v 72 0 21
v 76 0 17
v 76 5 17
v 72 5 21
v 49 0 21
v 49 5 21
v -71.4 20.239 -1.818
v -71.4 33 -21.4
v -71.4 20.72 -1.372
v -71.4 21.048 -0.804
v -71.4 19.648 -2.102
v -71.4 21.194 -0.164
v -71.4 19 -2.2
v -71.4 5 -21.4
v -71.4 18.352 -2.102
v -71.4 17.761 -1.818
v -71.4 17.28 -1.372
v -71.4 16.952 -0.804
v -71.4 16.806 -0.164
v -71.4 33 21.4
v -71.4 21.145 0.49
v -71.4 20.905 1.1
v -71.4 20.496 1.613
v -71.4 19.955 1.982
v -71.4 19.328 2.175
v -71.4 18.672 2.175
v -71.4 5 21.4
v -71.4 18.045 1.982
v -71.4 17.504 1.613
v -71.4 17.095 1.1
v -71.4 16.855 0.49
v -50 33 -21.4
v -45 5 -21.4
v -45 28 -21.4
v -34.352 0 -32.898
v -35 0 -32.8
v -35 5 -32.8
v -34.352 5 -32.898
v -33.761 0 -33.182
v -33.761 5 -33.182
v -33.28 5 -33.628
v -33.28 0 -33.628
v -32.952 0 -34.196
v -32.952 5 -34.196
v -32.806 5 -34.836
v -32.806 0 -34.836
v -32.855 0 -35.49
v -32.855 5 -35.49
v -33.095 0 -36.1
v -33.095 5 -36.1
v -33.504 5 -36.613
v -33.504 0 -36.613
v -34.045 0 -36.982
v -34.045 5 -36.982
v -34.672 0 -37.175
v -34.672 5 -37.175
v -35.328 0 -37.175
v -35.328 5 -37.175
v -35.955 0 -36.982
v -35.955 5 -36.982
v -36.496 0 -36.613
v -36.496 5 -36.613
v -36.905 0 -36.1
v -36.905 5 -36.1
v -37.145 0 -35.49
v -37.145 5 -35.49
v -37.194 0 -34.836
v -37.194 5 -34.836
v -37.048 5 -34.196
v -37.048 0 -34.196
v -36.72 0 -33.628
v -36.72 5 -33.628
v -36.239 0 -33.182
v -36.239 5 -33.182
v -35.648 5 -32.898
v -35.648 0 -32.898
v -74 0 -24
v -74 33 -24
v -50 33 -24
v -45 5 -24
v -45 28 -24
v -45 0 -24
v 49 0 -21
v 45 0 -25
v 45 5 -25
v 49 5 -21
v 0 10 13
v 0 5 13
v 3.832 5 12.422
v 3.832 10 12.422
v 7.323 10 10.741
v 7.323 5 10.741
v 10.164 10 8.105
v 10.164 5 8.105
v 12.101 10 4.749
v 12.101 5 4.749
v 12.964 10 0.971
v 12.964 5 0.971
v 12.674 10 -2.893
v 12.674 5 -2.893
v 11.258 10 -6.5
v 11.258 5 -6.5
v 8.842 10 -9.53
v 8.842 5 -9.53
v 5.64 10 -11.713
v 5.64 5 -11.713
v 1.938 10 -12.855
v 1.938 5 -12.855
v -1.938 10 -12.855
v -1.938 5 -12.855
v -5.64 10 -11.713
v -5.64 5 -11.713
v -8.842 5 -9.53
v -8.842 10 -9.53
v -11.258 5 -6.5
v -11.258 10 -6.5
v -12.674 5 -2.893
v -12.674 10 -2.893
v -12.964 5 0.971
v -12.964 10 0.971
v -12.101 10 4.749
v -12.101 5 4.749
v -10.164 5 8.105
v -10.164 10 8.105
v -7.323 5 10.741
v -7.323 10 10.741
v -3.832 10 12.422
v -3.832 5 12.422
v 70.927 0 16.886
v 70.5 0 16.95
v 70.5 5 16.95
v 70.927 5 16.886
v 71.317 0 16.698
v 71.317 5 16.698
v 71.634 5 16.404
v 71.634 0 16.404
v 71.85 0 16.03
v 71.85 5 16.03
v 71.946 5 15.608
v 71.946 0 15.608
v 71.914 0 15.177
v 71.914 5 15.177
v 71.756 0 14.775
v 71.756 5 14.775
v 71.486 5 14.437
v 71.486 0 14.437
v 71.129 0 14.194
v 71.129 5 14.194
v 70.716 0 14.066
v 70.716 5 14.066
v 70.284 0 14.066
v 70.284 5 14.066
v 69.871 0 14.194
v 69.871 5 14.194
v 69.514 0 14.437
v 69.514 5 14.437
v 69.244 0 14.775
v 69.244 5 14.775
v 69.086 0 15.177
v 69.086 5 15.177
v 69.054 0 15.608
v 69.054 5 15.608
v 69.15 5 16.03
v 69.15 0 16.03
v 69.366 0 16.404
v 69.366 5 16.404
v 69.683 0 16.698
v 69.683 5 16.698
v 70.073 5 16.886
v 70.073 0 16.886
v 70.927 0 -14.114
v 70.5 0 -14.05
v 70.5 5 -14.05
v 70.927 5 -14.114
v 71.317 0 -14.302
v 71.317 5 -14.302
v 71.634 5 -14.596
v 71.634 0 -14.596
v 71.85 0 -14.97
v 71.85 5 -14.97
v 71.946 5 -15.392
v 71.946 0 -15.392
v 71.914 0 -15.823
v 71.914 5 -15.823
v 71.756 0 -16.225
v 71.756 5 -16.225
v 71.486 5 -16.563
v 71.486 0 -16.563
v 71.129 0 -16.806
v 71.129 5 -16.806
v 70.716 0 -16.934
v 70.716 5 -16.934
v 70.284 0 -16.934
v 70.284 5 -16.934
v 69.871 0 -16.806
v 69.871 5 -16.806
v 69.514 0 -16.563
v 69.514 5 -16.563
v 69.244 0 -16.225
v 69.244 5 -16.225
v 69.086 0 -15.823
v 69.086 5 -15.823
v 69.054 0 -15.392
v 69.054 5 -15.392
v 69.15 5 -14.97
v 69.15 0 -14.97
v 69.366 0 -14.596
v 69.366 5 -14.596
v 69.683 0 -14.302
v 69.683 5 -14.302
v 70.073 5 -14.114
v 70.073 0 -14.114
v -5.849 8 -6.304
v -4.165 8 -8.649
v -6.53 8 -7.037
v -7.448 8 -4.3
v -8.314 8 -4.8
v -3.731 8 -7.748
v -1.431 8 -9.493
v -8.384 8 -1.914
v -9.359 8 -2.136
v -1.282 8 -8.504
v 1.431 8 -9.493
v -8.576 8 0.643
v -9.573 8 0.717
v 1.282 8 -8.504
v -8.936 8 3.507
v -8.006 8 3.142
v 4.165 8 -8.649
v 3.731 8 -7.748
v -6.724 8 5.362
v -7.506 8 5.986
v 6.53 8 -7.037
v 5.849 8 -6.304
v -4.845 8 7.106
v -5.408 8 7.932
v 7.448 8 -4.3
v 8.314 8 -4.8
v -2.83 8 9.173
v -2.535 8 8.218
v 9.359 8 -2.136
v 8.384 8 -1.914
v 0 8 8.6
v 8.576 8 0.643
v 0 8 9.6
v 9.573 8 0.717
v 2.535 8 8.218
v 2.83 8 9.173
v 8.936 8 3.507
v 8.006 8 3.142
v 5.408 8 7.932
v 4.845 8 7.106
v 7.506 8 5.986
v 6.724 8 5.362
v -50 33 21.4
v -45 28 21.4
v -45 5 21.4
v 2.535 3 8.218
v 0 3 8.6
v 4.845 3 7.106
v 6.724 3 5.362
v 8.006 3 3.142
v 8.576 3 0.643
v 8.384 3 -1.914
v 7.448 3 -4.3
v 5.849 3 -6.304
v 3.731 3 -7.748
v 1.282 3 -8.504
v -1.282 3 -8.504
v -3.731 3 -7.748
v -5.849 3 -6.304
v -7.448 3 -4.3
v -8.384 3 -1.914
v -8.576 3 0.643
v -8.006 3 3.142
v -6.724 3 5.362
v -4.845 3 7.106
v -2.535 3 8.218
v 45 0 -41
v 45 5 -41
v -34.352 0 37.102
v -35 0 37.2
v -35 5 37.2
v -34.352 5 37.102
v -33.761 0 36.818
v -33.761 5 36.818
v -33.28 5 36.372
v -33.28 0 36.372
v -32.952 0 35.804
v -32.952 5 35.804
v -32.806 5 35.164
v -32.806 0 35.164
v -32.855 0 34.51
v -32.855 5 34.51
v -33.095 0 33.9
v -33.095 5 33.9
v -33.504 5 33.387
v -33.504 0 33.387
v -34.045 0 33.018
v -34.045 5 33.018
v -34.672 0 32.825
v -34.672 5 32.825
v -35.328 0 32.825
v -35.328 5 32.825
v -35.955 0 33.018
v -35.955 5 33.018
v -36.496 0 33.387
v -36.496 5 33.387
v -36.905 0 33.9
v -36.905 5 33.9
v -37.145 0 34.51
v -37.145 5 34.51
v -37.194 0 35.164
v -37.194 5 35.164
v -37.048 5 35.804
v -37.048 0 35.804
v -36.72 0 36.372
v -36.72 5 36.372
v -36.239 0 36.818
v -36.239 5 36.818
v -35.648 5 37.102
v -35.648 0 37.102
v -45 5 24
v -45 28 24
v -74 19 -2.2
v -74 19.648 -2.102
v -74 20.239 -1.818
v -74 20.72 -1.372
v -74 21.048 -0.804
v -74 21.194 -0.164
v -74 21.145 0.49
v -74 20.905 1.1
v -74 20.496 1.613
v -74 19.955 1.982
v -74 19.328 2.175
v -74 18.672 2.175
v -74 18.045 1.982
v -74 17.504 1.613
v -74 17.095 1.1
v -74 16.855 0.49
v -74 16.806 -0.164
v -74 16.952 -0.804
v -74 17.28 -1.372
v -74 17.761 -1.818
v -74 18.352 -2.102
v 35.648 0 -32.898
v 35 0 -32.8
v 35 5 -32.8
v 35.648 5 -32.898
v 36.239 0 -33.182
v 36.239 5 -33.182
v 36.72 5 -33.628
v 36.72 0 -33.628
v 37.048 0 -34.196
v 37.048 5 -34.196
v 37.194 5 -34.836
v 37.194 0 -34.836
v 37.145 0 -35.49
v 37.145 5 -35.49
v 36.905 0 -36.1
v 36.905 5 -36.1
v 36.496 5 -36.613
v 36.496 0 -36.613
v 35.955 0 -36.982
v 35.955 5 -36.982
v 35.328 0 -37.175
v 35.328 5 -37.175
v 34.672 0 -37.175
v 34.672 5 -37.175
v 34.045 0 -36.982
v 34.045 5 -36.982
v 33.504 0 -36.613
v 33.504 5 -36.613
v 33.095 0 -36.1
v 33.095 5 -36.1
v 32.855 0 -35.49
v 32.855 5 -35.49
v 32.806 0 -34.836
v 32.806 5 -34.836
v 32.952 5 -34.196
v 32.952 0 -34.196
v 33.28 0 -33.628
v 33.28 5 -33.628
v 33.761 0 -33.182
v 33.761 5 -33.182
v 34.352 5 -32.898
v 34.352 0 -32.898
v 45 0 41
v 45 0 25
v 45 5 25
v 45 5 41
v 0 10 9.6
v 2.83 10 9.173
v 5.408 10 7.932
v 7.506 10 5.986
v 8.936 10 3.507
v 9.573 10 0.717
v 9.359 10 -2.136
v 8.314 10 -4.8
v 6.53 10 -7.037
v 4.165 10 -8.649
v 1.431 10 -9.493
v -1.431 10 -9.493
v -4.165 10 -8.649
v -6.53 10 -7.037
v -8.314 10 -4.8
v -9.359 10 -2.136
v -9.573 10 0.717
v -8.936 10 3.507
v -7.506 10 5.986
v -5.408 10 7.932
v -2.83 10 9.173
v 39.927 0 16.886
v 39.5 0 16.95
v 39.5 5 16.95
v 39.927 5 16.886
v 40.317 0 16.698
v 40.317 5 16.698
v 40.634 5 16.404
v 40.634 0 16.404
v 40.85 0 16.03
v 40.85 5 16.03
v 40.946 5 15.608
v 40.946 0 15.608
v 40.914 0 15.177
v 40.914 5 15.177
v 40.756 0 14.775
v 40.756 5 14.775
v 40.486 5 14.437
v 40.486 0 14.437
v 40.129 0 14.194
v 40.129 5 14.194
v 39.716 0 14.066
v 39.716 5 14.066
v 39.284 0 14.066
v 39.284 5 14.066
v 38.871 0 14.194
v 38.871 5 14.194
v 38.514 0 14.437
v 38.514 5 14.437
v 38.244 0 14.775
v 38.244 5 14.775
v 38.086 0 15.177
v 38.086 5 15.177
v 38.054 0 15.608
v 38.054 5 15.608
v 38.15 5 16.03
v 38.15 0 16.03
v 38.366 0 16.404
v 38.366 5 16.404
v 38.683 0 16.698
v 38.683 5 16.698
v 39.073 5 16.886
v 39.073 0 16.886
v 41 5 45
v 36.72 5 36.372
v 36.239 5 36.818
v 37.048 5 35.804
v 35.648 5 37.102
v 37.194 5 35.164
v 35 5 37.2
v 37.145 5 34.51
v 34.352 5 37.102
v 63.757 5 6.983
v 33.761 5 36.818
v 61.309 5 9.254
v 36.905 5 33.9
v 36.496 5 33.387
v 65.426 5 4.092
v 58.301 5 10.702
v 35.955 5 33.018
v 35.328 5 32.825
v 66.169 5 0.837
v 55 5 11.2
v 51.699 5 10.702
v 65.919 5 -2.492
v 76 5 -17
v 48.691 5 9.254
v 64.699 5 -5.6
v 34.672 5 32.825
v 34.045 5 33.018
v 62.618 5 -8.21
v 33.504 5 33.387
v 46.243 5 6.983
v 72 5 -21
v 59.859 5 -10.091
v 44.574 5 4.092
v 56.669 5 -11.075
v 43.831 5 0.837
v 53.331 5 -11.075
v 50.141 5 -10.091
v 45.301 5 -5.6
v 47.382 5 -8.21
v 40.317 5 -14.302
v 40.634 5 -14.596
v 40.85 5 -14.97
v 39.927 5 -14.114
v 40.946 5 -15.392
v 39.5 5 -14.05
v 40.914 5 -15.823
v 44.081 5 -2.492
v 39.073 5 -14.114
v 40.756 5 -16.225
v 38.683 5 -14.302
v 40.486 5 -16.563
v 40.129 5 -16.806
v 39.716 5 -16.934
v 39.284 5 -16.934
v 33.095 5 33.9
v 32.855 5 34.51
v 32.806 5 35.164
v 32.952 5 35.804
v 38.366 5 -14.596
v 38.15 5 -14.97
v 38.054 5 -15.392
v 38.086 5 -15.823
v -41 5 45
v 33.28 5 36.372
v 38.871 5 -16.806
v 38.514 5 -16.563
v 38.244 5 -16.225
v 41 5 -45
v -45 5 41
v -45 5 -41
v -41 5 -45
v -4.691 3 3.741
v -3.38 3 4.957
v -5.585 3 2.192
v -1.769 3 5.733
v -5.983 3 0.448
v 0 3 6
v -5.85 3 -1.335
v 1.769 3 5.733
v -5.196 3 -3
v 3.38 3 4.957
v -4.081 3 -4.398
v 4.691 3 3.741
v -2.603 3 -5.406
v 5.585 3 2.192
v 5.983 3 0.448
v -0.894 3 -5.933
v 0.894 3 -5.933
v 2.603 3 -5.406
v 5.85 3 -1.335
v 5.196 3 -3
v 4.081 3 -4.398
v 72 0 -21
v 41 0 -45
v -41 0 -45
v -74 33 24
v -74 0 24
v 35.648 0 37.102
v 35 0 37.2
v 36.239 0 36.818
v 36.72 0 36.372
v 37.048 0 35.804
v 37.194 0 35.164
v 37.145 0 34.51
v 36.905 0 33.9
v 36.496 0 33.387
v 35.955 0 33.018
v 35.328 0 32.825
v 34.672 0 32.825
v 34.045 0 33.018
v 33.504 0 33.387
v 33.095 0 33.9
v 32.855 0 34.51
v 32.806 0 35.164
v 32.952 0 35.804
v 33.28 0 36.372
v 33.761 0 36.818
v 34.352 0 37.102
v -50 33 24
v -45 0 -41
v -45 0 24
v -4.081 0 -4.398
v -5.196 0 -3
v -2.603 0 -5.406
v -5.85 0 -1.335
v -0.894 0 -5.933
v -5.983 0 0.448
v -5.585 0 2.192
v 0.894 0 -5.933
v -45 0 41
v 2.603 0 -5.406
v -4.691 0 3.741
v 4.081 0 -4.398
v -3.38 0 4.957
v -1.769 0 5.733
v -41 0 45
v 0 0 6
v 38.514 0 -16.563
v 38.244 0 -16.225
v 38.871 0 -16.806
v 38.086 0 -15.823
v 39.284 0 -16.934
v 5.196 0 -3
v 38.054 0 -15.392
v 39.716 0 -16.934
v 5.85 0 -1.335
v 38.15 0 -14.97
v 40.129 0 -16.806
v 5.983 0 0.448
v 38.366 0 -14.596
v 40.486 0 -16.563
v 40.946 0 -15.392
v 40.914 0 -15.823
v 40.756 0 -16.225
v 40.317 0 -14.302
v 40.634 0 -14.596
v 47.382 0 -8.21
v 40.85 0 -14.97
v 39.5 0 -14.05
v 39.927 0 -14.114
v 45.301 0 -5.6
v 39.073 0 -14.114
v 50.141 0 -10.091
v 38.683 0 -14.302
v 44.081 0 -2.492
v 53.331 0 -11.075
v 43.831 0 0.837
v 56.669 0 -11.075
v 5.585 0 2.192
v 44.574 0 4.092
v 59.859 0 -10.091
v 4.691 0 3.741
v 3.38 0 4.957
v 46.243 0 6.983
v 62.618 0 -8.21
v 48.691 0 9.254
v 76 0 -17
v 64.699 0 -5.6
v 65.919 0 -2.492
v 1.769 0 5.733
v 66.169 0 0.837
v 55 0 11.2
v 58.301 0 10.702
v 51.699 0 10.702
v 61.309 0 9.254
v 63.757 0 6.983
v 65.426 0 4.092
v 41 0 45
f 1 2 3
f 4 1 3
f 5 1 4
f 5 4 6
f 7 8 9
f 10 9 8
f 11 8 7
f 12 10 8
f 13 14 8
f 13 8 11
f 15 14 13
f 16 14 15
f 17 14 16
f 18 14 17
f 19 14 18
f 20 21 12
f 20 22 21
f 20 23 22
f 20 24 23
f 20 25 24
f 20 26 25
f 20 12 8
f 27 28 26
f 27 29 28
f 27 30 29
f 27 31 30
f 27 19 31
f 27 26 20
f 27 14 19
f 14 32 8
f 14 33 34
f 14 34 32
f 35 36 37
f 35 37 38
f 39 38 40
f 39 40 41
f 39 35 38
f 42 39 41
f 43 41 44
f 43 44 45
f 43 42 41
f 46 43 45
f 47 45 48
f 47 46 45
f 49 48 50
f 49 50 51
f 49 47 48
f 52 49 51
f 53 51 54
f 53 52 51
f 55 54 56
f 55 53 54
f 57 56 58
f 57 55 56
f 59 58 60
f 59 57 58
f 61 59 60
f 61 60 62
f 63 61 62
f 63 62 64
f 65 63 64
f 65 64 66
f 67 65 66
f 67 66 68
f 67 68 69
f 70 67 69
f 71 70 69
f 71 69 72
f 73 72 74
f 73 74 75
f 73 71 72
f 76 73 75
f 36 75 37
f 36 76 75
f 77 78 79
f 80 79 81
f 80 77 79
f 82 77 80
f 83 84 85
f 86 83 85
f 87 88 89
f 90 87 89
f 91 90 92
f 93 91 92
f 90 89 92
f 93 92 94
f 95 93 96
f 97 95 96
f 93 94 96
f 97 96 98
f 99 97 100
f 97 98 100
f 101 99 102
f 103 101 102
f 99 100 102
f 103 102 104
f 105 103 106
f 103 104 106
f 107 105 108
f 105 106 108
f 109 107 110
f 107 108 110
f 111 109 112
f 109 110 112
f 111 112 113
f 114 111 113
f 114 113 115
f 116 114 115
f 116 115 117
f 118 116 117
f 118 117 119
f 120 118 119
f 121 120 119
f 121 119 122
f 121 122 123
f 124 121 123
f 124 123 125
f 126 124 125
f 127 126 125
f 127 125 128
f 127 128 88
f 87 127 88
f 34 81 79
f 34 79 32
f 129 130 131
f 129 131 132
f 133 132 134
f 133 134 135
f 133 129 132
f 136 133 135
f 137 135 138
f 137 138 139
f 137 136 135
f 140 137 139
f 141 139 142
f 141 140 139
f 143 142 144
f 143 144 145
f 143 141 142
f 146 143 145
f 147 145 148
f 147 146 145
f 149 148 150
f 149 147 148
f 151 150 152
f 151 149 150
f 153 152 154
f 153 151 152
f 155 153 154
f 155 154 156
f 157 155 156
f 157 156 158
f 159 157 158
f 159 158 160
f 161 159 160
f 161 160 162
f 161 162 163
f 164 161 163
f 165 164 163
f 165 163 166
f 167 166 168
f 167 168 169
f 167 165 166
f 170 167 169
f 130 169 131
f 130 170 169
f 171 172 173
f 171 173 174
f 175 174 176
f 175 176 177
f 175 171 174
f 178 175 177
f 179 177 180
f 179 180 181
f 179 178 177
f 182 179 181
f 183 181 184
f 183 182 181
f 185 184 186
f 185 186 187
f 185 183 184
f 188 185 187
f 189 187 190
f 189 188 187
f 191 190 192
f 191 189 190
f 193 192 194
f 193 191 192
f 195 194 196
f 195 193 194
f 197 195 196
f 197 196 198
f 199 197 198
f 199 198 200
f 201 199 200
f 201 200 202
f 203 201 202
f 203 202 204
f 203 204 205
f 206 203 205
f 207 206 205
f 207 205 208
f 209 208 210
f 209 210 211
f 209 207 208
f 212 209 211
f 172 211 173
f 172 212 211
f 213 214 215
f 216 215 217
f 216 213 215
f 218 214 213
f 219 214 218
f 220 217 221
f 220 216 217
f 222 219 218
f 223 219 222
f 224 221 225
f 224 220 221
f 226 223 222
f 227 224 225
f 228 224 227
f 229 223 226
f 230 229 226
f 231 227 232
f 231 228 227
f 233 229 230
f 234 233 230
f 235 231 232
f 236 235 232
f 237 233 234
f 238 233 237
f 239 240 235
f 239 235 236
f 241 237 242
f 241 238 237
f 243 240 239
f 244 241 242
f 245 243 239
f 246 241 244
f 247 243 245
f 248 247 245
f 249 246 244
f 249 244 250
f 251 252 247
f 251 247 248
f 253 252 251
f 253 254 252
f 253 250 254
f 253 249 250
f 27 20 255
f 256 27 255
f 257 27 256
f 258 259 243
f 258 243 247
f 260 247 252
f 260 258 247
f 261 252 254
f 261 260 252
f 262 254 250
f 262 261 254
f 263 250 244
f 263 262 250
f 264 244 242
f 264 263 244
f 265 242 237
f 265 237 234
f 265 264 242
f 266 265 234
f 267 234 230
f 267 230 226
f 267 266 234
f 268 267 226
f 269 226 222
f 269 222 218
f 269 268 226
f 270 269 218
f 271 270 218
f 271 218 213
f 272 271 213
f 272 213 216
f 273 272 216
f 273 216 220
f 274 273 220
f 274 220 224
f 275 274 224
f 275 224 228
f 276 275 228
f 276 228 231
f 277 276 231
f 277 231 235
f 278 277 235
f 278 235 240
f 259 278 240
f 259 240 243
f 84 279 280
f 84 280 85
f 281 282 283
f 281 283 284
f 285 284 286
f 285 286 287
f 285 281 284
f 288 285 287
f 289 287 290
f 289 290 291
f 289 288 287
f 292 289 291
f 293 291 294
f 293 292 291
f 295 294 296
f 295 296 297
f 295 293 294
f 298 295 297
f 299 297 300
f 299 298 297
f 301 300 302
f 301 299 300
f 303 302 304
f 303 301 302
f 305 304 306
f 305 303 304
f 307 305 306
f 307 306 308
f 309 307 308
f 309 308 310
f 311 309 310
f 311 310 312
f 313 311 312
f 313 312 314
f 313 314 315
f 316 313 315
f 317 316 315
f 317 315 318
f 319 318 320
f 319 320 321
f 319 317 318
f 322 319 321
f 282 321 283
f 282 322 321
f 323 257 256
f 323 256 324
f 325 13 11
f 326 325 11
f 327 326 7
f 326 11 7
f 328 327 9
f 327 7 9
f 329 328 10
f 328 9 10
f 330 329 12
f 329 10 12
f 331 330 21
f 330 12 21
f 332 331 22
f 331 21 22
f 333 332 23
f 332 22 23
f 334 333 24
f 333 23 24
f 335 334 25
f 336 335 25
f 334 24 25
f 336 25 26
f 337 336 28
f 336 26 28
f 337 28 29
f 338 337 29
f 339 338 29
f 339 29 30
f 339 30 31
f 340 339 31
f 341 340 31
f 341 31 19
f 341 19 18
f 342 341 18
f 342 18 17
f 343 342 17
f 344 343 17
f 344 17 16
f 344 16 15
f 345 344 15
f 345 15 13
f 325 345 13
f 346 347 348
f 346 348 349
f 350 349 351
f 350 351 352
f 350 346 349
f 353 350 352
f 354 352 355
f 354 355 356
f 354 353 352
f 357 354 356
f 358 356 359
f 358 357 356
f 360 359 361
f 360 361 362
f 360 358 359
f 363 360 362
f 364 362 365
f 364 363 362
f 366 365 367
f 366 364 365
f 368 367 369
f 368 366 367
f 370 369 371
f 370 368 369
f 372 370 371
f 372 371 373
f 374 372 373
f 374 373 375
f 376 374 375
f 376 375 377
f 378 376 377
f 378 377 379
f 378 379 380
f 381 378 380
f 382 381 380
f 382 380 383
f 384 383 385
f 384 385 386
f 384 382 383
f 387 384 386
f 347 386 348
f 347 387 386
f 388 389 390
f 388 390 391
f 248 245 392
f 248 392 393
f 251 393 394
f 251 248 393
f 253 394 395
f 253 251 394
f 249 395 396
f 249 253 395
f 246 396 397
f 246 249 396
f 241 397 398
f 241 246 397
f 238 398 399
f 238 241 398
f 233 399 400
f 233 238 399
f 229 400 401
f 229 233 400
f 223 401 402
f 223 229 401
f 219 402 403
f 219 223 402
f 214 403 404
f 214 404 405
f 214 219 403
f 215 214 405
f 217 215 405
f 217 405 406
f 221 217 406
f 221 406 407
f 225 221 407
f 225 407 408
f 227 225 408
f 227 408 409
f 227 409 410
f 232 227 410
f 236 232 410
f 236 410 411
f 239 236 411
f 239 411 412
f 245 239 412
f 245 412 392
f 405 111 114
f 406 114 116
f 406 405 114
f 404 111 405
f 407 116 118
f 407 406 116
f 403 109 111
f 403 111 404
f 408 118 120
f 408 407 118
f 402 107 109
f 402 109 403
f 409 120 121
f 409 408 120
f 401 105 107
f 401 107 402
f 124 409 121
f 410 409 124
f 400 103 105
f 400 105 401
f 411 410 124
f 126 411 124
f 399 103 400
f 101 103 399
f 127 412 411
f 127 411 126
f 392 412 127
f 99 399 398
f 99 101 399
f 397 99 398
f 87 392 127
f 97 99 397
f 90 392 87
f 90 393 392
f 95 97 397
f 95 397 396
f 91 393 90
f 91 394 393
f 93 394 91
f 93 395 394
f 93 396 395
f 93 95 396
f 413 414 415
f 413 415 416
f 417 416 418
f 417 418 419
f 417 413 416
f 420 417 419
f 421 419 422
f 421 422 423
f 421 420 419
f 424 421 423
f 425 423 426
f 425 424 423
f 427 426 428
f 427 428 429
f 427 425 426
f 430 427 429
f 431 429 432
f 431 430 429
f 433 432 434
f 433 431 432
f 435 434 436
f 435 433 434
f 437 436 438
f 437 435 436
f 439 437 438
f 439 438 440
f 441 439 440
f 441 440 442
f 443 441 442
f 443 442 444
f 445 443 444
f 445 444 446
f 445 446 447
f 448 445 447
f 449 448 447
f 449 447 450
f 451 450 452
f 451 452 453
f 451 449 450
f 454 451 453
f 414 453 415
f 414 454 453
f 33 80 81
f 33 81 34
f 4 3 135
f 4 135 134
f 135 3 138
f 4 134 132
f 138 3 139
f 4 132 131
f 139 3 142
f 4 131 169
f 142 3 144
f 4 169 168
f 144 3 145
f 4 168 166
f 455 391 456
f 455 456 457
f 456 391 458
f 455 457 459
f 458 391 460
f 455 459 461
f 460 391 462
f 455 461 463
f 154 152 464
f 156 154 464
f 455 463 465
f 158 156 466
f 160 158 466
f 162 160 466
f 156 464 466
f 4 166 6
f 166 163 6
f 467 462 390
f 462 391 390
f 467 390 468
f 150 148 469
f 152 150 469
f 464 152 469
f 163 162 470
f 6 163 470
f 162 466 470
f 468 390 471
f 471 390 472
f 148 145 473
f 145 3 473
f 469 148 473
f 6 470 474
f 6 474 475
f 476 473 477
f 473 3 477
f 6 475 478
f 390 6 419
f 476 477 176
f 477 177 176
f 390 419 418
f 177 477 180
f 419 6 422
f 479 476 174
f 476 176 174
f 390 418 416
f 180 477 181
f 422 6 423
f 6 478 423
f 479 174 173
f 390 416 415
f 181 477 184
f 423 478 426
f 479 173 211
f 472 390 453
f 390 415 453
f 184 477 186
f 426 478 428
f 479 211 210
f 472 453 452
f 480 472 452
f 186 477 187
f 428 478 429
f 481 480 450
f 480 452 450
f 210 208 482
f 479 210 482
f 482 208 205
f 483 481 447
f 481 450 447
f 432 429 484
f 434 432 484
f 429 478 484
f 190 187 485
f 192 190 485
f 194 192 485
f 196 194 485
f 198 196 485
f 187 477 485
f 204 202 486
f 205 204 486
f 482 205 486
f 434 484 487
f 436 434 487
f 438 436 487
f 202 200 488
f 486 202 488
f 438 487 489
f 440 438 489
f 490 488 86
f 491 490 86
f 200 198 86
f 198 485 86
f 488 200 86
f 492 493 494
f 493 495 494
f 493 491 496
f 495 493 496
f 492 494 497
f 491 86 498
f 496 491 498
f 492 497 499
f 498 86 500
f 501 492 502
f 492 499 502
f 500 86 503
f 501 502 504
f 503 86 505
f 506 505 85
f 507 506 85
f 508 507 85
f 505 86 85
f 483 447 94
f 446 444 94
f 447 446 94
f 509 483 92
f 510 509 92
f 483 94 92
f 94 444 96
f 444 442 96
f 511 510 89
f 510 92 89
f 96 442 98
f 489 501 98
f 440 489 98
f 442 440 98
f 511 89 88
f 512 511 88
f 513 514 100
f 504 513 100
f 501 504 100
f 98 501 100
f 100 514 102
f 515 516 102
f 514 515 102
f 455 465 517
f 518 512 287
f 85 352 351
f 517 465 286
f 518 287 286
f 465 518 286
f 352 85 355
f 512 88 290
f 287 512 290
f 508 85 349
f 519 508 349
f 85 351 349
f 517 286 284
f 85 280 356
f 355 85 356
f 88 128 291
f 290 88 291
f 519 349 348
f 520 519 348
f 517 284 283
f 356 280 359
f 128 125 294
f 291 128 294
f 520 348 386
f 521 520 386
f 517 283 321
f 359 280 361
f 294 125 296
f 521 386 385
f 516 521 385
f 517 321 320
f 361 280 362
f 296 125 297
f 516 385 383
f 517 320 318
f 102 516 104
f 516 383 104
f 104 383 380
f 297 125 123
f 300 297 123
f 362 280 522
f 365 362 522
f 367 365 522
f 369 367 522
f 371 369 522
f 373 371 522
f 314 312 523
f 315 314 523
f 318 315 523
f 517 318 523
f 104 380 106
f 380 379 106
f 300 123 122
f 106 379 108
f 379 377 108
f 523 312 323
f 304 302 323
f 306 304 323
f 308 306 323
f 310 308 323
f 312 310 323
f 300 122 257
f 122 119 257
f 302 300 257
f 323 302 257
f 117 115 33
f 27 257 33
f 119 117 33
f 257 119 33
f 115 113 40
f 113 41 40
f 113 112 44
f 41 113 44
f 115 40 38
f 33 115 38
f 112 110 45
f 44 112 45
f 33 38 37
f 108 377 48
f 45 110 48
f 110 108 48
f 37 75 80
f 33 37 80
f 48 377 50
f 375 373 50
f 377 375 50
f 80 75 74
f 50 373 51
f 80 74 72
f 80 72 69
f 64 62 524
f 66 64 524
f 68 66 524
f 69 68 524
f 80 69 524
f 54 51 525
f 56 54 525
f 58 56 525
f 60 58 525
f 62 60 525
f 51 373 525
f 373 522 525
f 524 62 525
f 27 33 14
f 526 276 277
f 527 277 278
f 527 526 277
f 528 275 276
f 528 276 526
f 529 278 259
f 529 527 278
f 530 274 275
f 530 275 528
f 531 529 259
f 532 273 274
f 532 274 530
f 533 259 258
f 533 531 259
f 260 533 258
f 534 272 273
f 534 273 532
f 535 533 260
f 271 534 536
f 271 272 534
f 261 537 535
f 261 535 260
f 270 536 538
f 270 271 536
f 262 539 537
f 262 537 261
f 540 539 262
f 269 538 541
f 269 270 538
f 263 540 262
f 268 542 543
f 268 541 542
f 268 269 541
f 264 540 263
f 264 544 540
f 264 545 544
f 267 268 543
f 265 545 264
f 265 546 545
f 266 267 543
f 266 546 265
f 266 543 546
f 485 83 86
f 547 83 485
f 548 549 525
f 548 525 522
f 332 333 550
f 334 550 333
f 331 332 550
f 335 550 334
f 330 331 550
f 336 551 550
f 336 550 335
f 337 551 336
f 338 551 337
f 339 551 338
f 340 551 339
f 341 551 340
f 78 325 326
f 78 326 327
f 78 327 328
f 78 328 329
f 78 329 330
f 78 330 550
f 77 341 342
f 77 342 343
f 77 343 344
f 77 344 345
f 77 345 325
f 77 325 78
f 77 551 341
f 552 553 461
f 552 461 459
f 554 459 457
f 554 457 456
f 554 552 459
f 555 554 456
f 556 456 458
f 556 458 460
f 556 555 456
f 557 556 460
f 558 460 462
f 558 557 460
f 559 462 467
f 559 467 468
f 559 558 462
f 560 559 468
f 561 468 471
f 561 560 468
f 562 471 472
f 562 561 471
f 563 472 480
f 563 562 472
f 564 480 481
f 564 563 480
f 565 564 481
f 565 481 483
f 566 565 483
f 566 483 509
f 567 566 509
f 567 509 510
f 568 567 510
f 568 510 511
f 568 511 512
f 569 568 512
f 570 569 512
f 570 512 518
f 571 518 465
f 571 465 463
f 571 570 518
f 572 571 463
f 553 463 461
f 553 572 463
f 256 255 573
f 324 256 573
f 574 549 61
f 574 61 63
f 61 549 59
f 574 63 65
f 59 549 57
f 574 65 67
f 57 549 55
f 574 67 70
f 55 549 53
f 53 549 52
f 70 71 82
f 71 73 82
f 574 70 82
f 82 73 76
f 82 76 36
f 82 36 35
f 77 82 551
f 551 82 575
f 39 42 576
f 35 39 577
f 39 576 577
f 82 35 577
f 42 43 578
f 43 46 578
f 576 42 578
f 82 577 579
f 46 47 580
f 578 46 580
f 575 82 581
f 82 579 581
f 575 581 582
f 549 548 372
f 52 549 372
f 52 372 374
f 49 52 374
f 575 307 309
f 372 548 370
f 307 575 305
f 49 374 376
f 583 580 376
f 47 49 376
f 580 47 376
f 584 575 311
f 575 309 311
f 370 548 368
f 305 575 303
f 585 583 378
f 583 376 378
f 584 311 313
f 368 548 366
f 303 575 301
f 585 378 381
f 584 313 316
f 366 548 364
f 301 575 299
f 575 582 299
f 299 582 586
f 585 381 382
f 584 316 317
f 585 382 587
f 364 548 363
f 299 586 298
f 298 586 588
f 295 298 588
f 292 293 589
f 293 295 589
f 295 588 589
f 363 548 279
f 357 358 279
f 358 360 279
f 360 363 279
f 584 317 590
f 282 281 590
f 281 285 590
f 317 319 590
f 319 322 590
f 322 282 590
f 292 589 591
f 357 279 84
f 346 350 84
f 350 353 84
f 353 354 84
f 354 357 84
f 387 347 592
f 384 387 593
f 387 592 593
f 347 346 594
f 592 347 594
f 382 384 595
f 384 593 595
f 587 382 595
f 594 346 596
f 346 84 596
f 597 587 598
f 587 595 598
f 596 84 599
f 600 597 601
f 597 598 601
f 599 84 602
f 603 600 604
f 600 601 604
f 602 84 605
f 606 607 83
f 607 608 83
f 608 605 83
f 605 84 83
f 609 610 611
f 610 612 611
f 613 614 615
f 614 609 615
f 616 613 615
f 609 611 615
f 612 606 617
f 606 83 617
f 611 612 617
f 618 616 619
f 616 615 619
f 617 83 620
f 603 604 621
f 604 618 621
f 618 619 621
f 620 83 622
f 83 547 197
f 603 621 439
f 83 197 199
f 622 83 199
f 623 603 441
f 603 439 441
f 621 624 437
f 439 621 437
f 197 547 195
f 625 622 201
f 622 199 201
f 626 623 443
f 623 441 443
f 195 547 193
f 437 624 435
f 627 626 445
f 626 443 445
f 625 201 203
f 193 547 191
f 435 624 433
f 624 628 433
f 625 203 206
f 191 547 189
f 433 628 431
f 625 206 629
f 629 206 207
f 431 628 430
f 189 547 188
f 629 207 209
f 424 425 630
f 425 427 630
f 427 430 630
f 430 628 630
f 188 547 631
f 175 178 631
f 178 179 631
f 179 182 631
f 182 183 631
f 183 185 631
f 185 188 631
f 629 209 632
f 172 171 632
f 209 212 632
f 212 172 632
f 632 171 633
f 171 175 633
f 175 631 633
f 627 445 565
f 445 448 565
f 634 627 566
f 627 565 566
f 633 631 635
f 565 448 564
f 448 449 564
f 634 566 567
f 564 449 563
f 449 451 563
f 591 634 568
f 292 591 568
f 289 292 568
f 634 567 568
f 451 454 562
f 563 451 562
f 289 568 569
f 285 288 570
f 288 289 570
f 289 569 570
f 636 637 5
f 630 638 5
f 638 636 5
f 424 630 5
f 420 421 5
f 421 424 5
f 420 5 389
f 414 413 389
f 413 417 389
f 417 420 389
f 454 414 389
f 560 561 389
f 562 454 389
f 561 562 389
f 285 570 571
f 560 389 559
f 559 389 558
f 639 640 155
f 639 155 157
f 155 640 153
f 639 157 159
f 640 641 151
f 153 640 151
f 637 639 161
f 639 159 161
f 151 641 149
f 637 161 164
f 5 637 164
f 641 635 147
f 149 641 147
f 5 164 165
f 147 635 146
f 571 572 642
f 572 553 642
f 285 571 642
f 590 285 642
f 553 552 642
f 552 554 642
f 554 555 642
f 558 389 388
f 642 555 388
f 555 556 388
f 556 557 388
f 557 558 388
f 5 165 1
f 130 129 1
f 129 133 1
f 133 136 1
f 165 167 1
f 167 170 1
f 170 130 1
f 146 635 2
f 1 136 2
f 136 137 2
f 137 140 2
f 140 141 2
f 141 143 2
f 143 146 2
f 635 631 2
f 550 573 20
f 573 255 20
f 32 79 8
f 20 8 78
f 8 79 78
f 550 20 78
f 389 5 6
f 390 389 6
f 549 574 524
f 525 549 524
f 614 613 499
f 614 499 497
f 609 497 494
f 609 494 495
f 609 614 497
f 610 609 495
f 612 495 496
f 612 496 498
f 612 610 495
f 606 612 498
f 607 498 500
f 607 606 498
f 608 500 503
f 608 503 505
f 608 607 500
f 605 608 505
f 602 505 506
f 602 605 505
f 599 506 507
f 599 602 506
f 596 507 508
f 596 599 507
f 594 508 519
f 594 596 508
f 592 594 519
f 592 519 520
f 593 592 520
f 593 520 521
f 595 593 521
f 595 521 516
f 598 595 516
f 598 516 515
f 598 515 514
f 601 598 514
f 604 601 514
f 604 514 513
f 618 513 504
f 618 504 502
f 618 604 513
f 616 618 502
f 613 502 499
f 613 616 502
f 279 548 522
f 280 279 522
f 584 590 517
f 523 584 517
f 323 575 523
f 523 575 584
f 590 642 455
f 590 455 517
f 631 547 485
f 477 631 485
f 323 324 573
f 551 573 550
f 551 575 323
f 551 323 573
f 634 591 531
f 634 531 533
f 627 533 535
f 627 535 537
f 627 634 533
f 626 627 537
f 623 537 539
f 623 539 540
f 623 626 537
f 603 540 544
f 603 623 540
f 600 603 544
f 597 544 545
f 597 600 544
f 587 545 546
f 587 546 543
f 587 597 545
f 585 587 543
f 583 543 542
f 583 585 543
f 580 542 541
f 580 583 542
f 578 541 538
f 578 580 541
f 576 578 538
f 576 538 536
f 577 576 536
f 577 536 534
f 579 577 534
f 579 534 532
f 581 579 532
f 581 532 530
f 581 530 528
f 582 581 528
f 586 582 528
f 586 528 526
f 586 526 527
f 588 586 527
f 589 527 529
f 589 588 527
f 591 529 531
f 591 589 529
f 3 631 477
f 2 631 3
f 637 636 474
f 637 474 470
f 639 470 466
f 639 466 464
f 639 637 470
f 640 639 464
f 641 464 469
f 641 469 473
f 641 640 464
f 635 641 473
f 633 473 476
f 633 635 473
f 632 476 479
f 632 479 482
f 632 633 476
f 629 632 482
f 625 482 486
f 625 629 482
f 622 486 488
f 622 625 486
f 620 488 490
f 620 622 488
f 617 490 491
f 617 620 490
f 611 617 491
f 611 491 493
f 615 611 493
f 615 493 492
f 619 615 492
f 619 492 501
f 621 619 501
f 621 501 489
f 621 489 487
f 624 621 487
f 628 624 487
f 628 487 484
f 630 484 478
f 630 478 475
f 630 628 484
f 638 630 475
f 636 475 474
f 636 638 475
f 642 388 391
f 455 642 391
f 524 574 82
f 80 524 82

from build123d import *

# Parameters (mm, degrees)
SKETCH1_R           = 2.2
SKETCH1_R_2         = 1.45
SKETCH1_R_3         = 13
SKETCH1_R_4         = 11.2
BOSS_EXTRUDE1_DEPTH = 5
BOSS_EXTRUDE2_DEPTH = 33
SKETCH1_4_R         = 13
SKETCH1_4_R_2       = 6
BOSS_EXTRUDE3_DEPTH = 3
SKETCH1_5_R         = 13
SKETCH1_5_R_2       = 8.6
BOSS_EXTRUDE4_DEPTH = 8
SKETCH1_6_R         = 13
SKETCH1_6_R_2       = 9.6
BOSS_EXTRUDE5_DEPTH = 10
SKETCH2_R           = 2.2
CUT_EXTRUDE1_DEPTH  = 10
CHAMFER1_SIZE       = 4
CHAMFER2_SIZE       = 5


with BuildPart() as part:
    # Sketch1 → Boss-Extrude1 (new body)
    with BuildSketch(Plane(origin=(0, 0, 0), x_dir=(1, 0, 0), z_dir=(0, 1, 0))):
        Polygon((45, 45), (-45, 45), (-45, 24), (-74, 24), (-74, -24), (-45, -24), (-45, -45), (45, -45), (45, -21), (76, -21), (76, 21), (45, 21), align=None)
        with Locations((-35, -35)):
            Circle(SKETCH1_R, mode=Mode.SUBTRACT)
        with Locations((35, -35)):
            Circle(SKETCH1_R, mode=Mode.SUBTRACT)
        with Locations((39.5, -15.5)):
            Circle(SKETCH1_R_2, mode=Mode.SUBTRACT)
        with Locations((70.5, -15.5)):
            Circle(SKETCH1_R_2, mode=Mode.SUBTRACT)
        Circle(SKETCH1_R_3, mode=Mode.SUBTRACT)
        with Locations((-35, 35)):
            Circle(SKETCH1_R, mode=Mode.SUBTRACT)
        with Locations((55, 0)):
            Circle(SKETCH1_R_4, mode=Mode.SUBTRACT)
        with Locations((39.5, 15.5)):
            Circle(SKETCH1_R_2, mode=Mode.SUBTRACT)
        with Locations((70.5, 15.5)):
            Circle(SKETCH1_R_2, mode=Mode.SUBTRACT)
        with Locations((35, 35)):
            Circle(SKETCH1_R, mode=Mode.SUBTRACT)
    extrude(amount=BOSS_EXTRUDE1_DEPTH)

    # Sketch1<3> → Boss-Extrude2 (add)
    with BuildSketch(Plane(origin=(0, 0, 0), x_dir=(1, 0, 0), z_dir=(0, 1, 0))):
        Polygon((-45, 21.4), (-45, 24), (-74, 24), (-74, -24), (-45, -24), (-45, -21.4), (-71.4, -21.4), (-71.4, 21.4), align=None)
    extrude(amount=BOSS_EXTRUDE2_DEPTH)

    # Sketch1<4> → Boss-Extrude3 (add)
    with BuildSketch(Plane(origin=(0, 0, 0), x_dir=(1, 0, 0), z_dir=(0, 1, 0))):
        Circle(SKETCH1_4_R)
        Circle(SKETCH1_4_R_2, mode=Mode.SUBTRACT)
    extrude(amount=BOSS_EXTRUDE3_DEPTH)

    # Sketch1<5> → Boss-Extrude4 (add)
    with BuildSketch(Plane(origin=(0, 0, 0), x_dir=(1, 0, 0), z_dir=(0, 1, 0))):
        Circle(SKETCH1_5_R)
        Circle(SKETCH1_5_R_2, mode=Mode.SUBTRACT)
    extrude(amount=BOSS_EXTRUDE4_DEPTH)

    # Sketch1<6> → Boss-Extrude5 (add)
    with BuildSketch(Plane(origin=(0, 0, 0), x_dir=(1, 0, 0), z_dir=(0, 1, 0))):
        Circle(SKETCH1_6_R)
        Circle(SKETCH1_6_R_2, mode=Mode.SUBTRACT)
    extrude(amount=BOSS_EXTRUDE5_DEPTH)

    # Sketch2 → Cut-Extrude1 (cut)
    with BuildSketch(Plane(origin=(-71.4, 0, 0), x_dir=(0, 0, -1), z_dir=(1, 0, 0))):
        with Locations((0, 19)):
            Circle(SKETCH2_R)
    extrude(amount=-CUT_EXTRUDE1_DEPTH, mode=Mode.SUBTRACT)

    # Chamfer1
    chamfer1_edges = [part.edges().sort_by_distance(p)[0] for p in [
        (-45, 2.5, 45),
        (-45, 2.5, -45),
        (45, 2.5, -45),
        (45, 2.5, -21),
        (76, 2.5, -21),
        (76, 2.5, 21),
        (45, 2.5, 21),
        (45, 2.5, 45),
    ]]
    chamfer(chamfer1_edges, length=CHAMFER1_SIZE)

    # Chamfer2
    chamfer2_edges = [part.edges().sort_by_distance(p)[0] for p in [
        (-45, 33, -22.7),
        (-45, 33, 22.7),
    ]]
    chamfer(chamfer2_edges, length=CHAMFER2_SIZE)


solid = part.part
